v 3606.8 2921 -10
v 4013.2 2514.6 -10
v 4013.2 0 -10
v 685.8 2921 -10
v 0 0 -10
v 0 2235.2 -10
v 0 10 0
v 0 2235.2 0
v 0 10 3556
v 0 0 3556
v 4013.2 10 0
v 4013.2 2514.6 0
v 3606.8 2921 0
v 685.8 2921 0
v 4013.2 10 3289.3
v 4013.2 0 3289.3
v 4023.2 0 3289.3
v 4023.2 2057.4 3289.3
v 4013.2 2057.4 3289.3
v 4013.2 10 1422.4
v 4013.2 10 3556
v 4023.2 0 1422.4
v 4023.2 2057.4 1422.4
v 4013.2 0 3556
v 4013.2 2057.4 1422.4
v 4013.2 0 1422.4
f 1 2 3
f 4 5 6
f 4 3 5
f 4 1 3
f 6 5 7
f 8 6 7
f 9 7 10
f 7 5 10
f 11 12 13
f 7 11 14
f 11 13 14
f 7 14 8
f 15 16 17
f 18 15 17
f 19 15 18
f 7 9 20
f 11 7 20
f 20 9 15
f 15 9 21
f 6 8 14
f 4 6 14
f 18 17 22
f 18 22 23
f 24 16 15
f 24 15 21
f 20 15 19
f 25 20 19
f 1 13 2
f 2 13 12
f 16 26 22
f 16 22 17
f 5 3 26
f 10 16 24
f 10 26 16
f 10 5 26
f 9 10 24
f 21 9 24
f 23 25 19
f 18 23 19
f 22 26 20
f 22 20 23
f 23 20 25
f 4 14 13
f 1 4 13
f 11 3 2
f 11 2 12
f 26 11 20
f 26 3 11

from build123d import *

# Parameters (mm, degrees)
PAD_DEPTH    = 10
SKETCH001_W  = 4013.2
SKETCH001_H  = 3556
PAD001_DEPTH = 10
SKETCH002_W  = 2057.4
SKETCH002_H  = 1866.9
PAD002_DEPTH = 10


with BuildPart() as part:
    # Sketch → Pad (new body)
    with BuildSketch(Plane.XY):
        Polygon((0, 0), (0, 2235.2), (685.8, 2921), (3606.8, 2921), (4013.2, 2514.6), (4013.2, 0), align=None)
    extrude(amount=-PAD_DEPTH)

    # Sketch001 → Pad001 (join)
    with BuildSketch(Plane.XZ):
        with Locations((2006.6, 1778)):
            Rectangle(SKETCH001_W, SKETCH001_H)
    extrude(amount=-PAD001_DEPTH)

    # Sketch002 (on Face7 of Pad001) → Pad002 (join)
    with BuildSketch(Plane.YZ.offset(4013.2)):
        with Locations((1028.7, 2355.85)):
            Rectangle(SKETCH002_W, SKETCH002_H)
    extrude(amount=PAD002_DEPTH)


solid = part.part
